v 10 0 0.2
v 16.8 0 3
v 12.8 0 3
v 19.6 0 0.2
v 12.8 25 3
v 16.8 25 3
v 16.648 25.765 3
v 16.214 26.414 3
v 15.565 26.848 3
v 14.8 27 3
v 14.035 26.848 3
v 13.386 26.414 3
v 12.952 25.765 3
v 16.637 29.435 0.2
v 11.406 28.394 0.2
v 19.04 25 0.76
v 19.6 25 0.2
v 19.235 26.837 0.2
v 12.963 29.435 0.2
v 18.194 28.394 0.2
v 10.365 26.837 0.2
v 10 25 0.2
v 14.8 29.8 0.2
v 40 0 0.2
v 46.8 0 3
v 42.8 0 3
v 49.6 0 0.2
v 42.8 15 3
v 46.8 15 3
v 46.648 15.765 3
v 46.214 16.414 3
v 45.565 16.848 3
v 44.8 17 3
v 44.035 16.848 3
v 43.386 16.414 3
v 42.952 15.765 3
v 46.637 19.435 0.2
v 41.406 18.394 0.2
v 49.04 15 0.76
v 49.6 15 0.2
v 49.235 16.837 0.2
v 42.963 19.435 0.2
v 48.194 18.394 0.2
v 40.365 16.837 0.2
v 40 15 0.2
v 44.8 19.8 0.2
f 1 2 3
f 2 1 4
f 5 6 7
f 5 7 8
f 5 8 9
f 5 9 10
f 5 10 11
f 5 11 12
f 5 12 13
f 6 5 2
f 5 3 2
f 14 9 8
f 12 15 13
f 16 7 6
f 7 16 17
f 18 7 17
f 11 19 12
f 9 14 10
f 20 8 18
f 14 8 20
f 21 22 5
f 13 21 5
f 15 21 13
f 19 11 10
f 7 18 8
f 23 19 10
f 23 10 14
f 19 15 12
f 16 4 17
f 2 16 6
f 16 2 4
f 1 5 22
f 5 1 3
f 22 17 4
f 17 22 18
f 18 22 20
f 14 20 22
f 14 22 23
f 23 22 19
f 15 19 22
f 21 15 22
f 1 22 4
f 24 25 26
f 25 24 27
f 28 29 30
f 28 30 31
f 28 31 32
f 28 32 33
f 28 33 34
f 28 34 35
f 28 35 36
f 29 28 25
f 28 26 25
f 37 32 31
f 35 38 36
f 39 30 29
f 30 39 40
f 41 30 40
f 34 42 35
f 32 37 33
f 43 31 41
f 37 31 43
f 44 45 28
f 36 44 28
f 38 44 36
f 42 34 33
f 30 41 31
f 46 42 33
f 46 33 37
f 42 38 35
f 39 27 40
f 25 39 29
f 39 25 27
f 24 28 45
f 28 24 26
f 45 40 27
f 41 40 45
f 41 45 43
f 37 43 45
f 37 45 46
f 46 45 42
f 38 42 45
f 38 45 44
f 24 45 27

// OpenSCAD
// file: phgUtils.scad
/*
 *  OpenSCAD utilities 
 *
 *  by Ph.Gregoire AKA Greg Ware <greg.ware@laposte.net>
 *  
 *  Includes:
 *   - shorter macro modules to get a cube or cylinder with translation and rotation
 *   -  Due to some display defects in OpenSCAD preview (F5), some can use a small epsilon 
 *      so as to cut protruding apertures in solids
 *   - useful modules to build rounded corner cubes, triangle (wedges), etc
 *
 * History
 * Date         Author      Description
 * 2017/??/??   Ph.Gregoire Initial version(s)
 * 2018/07/18   Ph.Gregoire Rework for X5S corners
 *
 *  This work is licensed under the 
 *  Creative Commons Attribution 3.0 Unported License.
 *  To view a copy of this license, visit
 *    http://creativecommons.org/licenses/by/3.0/ 
 *  or send a letter to 
 *    Creative Commons, PO Box 1866, Mountain View, CA 94042, USA.
*/

// Thickness of supports for apertures
$_SUPPORT_THK=0.2;

// Cylinders $fn default
$_FN_CYL=32;

// Epsilon
$_EPSILON=0.2;

/* Simple translation */
module tr(dx,dy=0,dz=0) {
    translate([dx,dy,dz]) children();
}

/* Translate and rotate children */
module trrot(tx,ty,tz,ax,ay=0,az=0) {
    translate([tx,ty,tz]) rotate([ax,ay,az]) children();
}

/* translated cube */
module trcube(tx,ty,tz,dx,dy,dz) {
    translate([tx,ty,tz]) cube([dx,dy,dz]);
}

/* translated cube with epsilons along Z */
module trcube_eps(tx,ty,tz,dx,dy,dz) {
    translate([tx,ty,tz-$_EPSILON]) cube([dx,dy,dz+2*$_EPSILON]);
}

/* translated cylinder */
module trcyl(tx,ty,tz,d,h,center=false,fn=$_FN_CYL) {
	translate([tx,ty,tz]) cylinder(d=d,h=h,center=center,$fn=fn);
}

/* translated cylinder with epsilon along height (Z) */
module trcyl_eps(tx,ty,tz,d,h,center=false,fn=$_FN_CYL) {
    translate([tx,ty,tz-$_EPSILON]) cylinder(d=d,h=h+2*$_EPSILON,center=center,$fn=fn);
}

module trrotcyl(tx,ty,tz,ax,ay,az,d,h,center=false,fn=$_FN_CYL) {
	trrot(tx,ty,tz,ax,ay,az) cylinder(d=d,h=h,center=center,$fn=fn);
}

/* translated and rotated cylinder with epsilon along height (Z) */
module trrotcyl_eps(tx,ty,tz,ax,ay,az,d,h,center=false,fn=$_FN_CYL) {
    trrot(tx,ty,tz,ax,ay,az) translate([0,0,-$_EPSILON]) cylinder(d=d,h=h+2*$_EPSILON,center=center,$fn=fn);
}

/* translated and rotated cube */
module trrotcube(tx,ty,tz,ax,ay,az,dx,dy,dz) {
    trrot(tx,ty,tz,ax,ay,az) cube([dx,dy,dz]);
}

/* Translated rotate cube with diff children (in cube referential) */
module trrotcube_diff(tx,ty,tz,ax,ay,az,dx,dy,dz) {
    trrot(tx,ty,tz,ax,ay,az) difference() {
        cube([dx,dy,dz]);
        children();
    }
}

/* Box with apertures cut out from children */
module boxWithApertures(w,l,h,t) {
    // Bottom
    trcube(-w/2-t,-l/2-t,0,w+2*t,l+2*t,t);

    // sides
    for(s=[0:3]) {
        L=w*((s+1)%2)+l*(s%2)+2*t;
        P=l*((s+1)%2)+w*(s%2);
        
        rotate([0,0,s*90]) {
            translate([-L/2,P/2,t]) {
                difference() {
                    cube([L,t,h]);
                    // aperture
                    if($children>s) {
                        translate([thk,thk,0]) rotate([90,0,0]) children(s);
                    }
                }
            }
        }
    }

}

/* Make a support: remove a thin support layer from a flat shape */
module supportDiff(thk) {
    difference() {
        children(0);
        translate([0,0,thk/2]) {
            linear_extrude(height=$_SUPPORT_THK) projection() children(0);
        }
    }
}

/* Lateral vents 
    n: number of vents
    h: height of vent and vent spacing
    l: horizontal length of vent
    x: horizontal x offset of vent
    z: vertical offset of first vent
    t: thickness of panel
*/
module vents(n,h,l,x,z,t) {
    for(v=[0:n-1]) {
        trcube_eps(x,z+2*v*h,0,l,h,t);
    }
}

/* Fan vent 
    w: width of panel
    dz: height of center of fan
    df: diameter of fan
    dh: diameter of hub
    fs: Number of fan spokes
    t: thickness of panel
*/
module fanvent(w,dz,df,dh,fs,t) {
    difference() {
        // External
        trcyl_eps(w/2,dz,0,df,t);
        
        // central hub
        trcyl_eps(w/2,dz,0,dh,t);
        
        // spokes
        translate([w/2,dz,0]) {
            for(a=[0:fs-1]) {
                rotate([0,0,180+a*(360/fs)]) trcube_eps(-t/2,0,0,t,df,t);
            }
        }
    }
}
/* Fan mounting holes
    w: Width of panel
    dz: height of center of fan
    wfh: width of fan holes
    dfh: diameter of fan holes
    t: thickness of panel
*/
module fanholes(w,dz,wfh,dfh,t) {
    for(x=[-1,1]) {
        for(y=[-1,1]) {
            trcyl_eps(w/2+wfh/2*x,dz+wfh/2*y,0,dfh,t);
        }
    }
}

/* Position children in one corner of box, using a centered box */
module cornerPos(w,l,h,x,y,center=true) {
    translate([center?x*w/2:(x+1)*w/2,center?y*l/2:(y+1)*l/2,h]) {
        if(x==-1 && y==-1) children();
        if(x==1 && y==-1) rotate([0,0,90]) children();
        if(x==1 && y==1) rotate([0,0,180]) children();
        if(x==-1 && y==1) rotate([0,0,270]) children();
    }
}

/* Position children at each 4 corners of centered cube */ 
module cornersPos(w,l,h,center=true) {
 for(x=[-1,1]) {
        for(y=[-1,1]) {
            cornerPos(w,l,h,x,y,center=center) children();
        }
    }
}


/* Quarter Cone */
module quarterCone(r1,r2,h) {
    intersection() {
        cylinder(r1=r2,r2=r1,h=h);
        cube([r1>r2?r1:r2,r1>r2?r1:r2,h]);
    }
}

module quarterCyl(r,h) {
    intersection() {
        cylinder(r=r,h=h,$fn=$_FN_CYL);
        cube([r,r,h]);
    }
}

/* Corner rounding */
module champfer(rounding,h) {
    difference() {
        translate([-$_EPSILON,-$_EPSILON,-$_EPSILON])
            cube([rounding+$_EPSILON,rounding+$_EPSILON,h+2*$_EPSILON]);
        translate([rounding,rounding])
            cylinder(r=rounding,h=h);
    }
}

/* Triangle by extrusion. the a parameter is the rotation angle */
module triangle(dx,dy,h,a=0) {
    if(a<0) triangle(dx,dy,h,a=a+360);
    else {
        a=a%360;
        linear_extrude(height=h) {
            if(a<90) polygon(points=[[0,0],[dx,0],[0,dy],[0,0]]);
            else if(a<180) polygon(points=[[0,0],[dx,dy],[dx,0],[0,0]]);
            else if(a<270) polygon(points=[[dx,dy],[0,dy],[dx,0],[dx,dy]]);
            else if(a<360) polygon(points=[[0,0],[dx,dy],[0,dy],[0,0]]);
        }
    }
}

module roundedFlatBox(dx,dy,h,r) {
    linear_extrude(height=h)
    offset(r=r)
    translate([r,r]) square([dx-2*r,dy-2*r]);
}

module roundedBoundingBox(dx,dy,dz,rx,ry,rz) {
    minkowski() {
        trcube(rx,ry,rz,dx-2*rx,dy-2*ry,dz-2*rz);
        r=max(rx,ry,rz);
        scale([rx/r,ry/r,rz/r]) sphere(r);
    }
}

test();

module test() {
    //triangle(30,20,10,270);
    //quarterCyl(5,10);
    //champfer(5,10);
    roundedBoundingBox(40,50,20,5,10,7);
}
// main file
/*
 * Ultimate Tronxy X5S Corner Pulley Mounts
 *   
 * Dimensioning assumptions:
 *   - Motor shafts are aligned 20 mm to the inside of the frame
 *   - Pulleys diameter is 12 mm, with a 5mm bore, mounted on M5 screws
 *
 * Note that most dimensions are not arbitrary, and computed from physical
 * values of the printer and pulleys, designed so that belts run parallel 
 * to axis movements
 * 
 * Full Tronxy model requires 2020profile.scad from https://www.thingiverse.com/thing:2533048/files
 *
 * The design is inspired but not quite remixed from several existing
 * ones available notably on Thingiverse
 * 
 * Source maintained in GitHub at https://github.com/greg-ware/TronxyX5SUpgrades
 *
 +--------------------------------------------------------------------------
 | History
 | Date       |Version |Author      |Description
 | 2018/07/?? | <= v2  |Ph.Gregoire |Initial version(s)
 | 2018/07/07 | v3     |Ph.Gregoire |Proper belts alignement
 | 2018/07/16 | v4     |Ph.Gregoire |Extend legs, add champfers
 | 2018/07/19 | v4.01  |Ph.Gregoire |Fix TNut hammer size
 | 2018/07/19 | v4.02  |Ph.Gregoire |Fix tenon issue
 | 2018/07/18 | v5     |Ph.Gregoire |Endstop mount, zendstop arm, pulley raiser
 | 2018/07/25 | v5.1   |Ph.Gregoire |Fix pulley raiser
 | 2018/07/26 | v6.01  |Ph.Gregoire |Fix dimentional issues: sides too high
 | 2018/07/26 | v6.02  |Ph.Gregoire |Remove unusable TNut hole
 | 2018/07/26 | v6.03  |Ph.Gregoire |Fix pulley shaft position for belt paralelism
 | 2018/07/26 | v6.04  |Ph.Gregoire |Through-holes to access or replace corner screws
 | 2018/07/26 | v6.05  |Ph.Gregoire |Switches repositioning
 | 2018/07/26 | v6.06  |Ph.Gregoire |Side T-Nut repositioning
 | 2018/07/26 | v7.0   |Ph.Gregoire |Full Tronxy model reconstitution
 | 2018/10/14 | v8.0   |Ph.Gregoire |Use Conical head side TNut screws
 | 2018/10/14 | v8.01  |Ph.Gregoire |Add rigidification slits on the sides
 +-------------------------------------------------------------------------
 *
 *  This work is licensed under the 
 *  Creative Commons Attribution 3.0 Unported License.
 *  To view a copy of this license, visit
 *    http://creativecommons.org/licenses/by/3.0/ 
 *  or send a letter to 
 *    Creative Commons, PO Box 1866, Mountain View, CA 94042, USA.
*/

use <phgUtils.scad>

/* Modify the following parameter to generate
    - corner for LEFT or RIGHT side 
    - pulley raiser
*/
SIDE="LEFT";
//SIDE="RIGHT";

PART="CORNER";
//PART="RAISER";
//PART="ZENDSTOP";    // Generate the Z endstop support
//PART="CORNER_RAISER";
PART="SLITS";

/* Modify following depending if endstop is Left or right, or to print Z endstop arm */
ENDSTOPS="LEFT";
//ENDSTOPS="RIGHT";

/* Arbitrary parameters */
// Top plate thickness (original acrylic plate is 8mm, but this makes screw seats thin)
thk=10;	

// Thickness of external side walls
wallThk=5;

// Layer Height
layerH=0.2;

// champfer radius
champR=4;
champRPlate=3;

// profile tenon dimensions
tenonHeight=5.5;
tenonWidth=6;

// Size of the corner plate. Original is 
lFront=65;	// length along front (x)
lSide=60;	// length along side (y)

/* Below are the physical characteristics and dimensions of the new pulleys and axles */
pulleyDiam=12;
pulleyAxleDiam=5;	// pulley axles diameter
pulleyAxleHexThk=2.6;   // thickness of hex nut (M5) - keep mult of layer height

pulleyAxleHeadThk=3.6;  // thickness of screwHead (M5) - keep mult of layer height

/* M5x30 Axle screw */
pulleyAxleHeadDiam=11.5; 	// Diameter of the M5 screw head
pulleyAxleHeadThk=3.6;  // thickness of screwHead (M5) - keep mult of layer height

/* M5x50 Axle Screw (Poeliers) 
pulleyAxleHeadDiam=12; 	// Diameter of the M5 screw head
pulleyAxleHeadThk=2.8;  // thickness of screwHead (M5) - keep mult of layer height
*/

pulleyAxleHexDiam=9.5;  // diameter of hex nut (M5)

pulleyRaiserDiam=18;
pulleyHeight=8; // to determine raiser height

/* Rigidification slits 
   The slits will be sliced across the top plate and half way into the height */
slitDepth=3;
slitWidth=10;

/********************************************************/
/* Fixed constants of X5S by construction               */
profW=20;	// width of profile
motorShaftInset=20; // Distance from outside frame by which the motors shafts are inset
motorPulleyDiam=12; // Diameter of the motor pulley

// X-profile Assembly screws characteristics
assemblyScrewHeadDiam=9;
assemblyScrewHeadThk=2.5;
assemblyScrewDiam=5;

// T-nut screw dimensions
tnutScrewDiam=4;
tnutScrewSeatDiam=7.5;  // Diameter of the screw head
tnutHammerDiam=12;      // Diameter of the diagonal of the hammer nut

// top plate tnut positioning, this is somewhat arbitrary
tnutScrewSeatDepth=4;       // original has 8mm thickness
tnutScrewDistFromEdge=6;    // distance from edge of top plate tnut screw

// side TNut positioning, this is more or less arbitrary
sideTNutInset=0; /*v6.06*///profW/2; // How much to inset the TNut holes on the sides
sideTNutOffset=3*profW/2; // How much to offset the TNut holes on the sides
// Conical side TNut screw heads
sideTNutSeatDepth=2.4;  // slightly countersunken side screw heads (Was 1.4)
sideTNutScrewDiam=7.4;

// Endstops
endsHolesDiam=1;    // Diameter of the drill hole
endsHolesSpacing=10;// Spacing between the two screw holes
endsWidth=20;       // With of the endstop boxing

endsSwitchDepth=9;  // Distance from holes at which endstop closes
endsXHolesMegaGantryOffset=20; // How much to offset the holes for mega-gantry

// Z endstop support will be bolted on 20x40 frame
endsZSupportWidth=15;
endsZSupportLength=110;
switchHolesDiam=1.5;
switchHolesSpacing=10;
switchWidth=20;
switchHolesOffset=7.5;

/************************************************************************/
/* Begin computations                                                   */
/* Following parameters are computed from physical dimensions above     */

// positioning of outer pulley axle
outerAxleX=profW/2;
outerAxleY=motorShaftInset+(pulleyDiam-motorPulleyDiam)/2;

// positioning of inner pulley axle
innerAxleX=profW+pulleyAxleHeadDiam/2;
innerAxleY=outerAxleY+pulleyDiam;

// Compute overall widths
wFront=profW+wallThk;	// width along front (x)
wSide=profW+wallThk;	// width along sides (y)

// positions of shoulder notch: leave enough material for robustness
xNotch=wallThk+innerAxleX+pulleyAxleDiam+wallThk;
yNotch=wallThk+innerAxleY+pulleyAxleDiam;

// Cylinders $fn default
$_FN_CYL=32;
$_FN_CHAMP=16;

// Epsilon
$_EPSILON=0.2;

function getX5SPhysics()=[thk,wallThk,profW,ENDSTOPS,[outerAxleX,outerAxleY],[innerAxleX,innerAxleY]];

module tnutHole(tx,ty,seatDepth,h) {
	translate([tx,ty,-$_EPSILON]) {
		cylinder(d=tnutScrewSeatDiam,h=seatDepth+2*$_EPSILON,$fn=$_FN_CYL);
		cylinder(d=tnutScrewDiam,h=h+2*$_EPSILON,$fn=$_FN_CYL);
	}
}

module tnutConicalHole(tx,ty,seatDepth,h) {
	translate([tx,ty,-$_EPSILON]) {
		cylinder(d1=tnutScrewSeatDiam,d2=tnutScrewDiam,h=seatDepth+2*$_EPSILON,$fn=$_FN_CYL);
		cylinder(d=tnutScrewDiam,h=h+2*$_EPSILON,$fn=$_FN_CYL);
	}
}

module tnutTopPlateHole(tx,ty) {
    tnutHole(tx,ty,tnutScrewSeatDepth,thk);
}

module tnutSideWallHole(tx,ty) {
    tnutConicalHole(tx,ty,sideTNutSeatDepth,wallThk);
}

module shaftHoleScrew(x,y,t,screwDiam,screwHeadThk,screwHeadDiam,isScrew=true,isTop=false) {
    // make recess for pulley axle screw head
    if(isScrew) {
        trcyl_eps(x,y,isTop?0:t-screwHeadThk,screwHeadDiam,screwHeadThk);
    }
    
    // shaft for pulley axle screw
    trcyl_eps(x,y,0,screwDiam,t);
}

module shaftHoleScrewHexNut(x,y,t,screwDiam,screwHeadThk,screwHeadDiam,screwHexThk,screwHexDiam,isScrew=true,isHexNut=true) {
    
    shaftHoleScrew(x,y,t,screwDiam,screwHeadThk,screwHeadDiam,isScrew);

    // Imprint of hex nut
    if(isHexNut) {
        trcyl_eps(x,y,0,screwHexDiam,screwHexThk,fn=6);
    }
}   

module pulleyShaftHole(x,y,isScrew,isHexNut) {
    shaftHoleScrewHexNut(x+wallThk,y+wallThk,thk+tenonHeight,pulleyAxleDiam,pulleyAxleHeadThk+tenonHeight,pulleyAxleHeadDiam,pulleyAxleHexThk,pulleyAxleHexDiam,isScrew,isHexNut);
}

module basePlate(isLeft) {
	difference() {
		union() {
			// base plate
			linear_extrude(height=thk,convexity=2) {
                offset(r=champRPlate,$fn=$_FN_CHAMP)
				polygon(points=[
                            [champRPlate,champRPlate],
                            [lSide-champRPlate,champRPlate],
                            [lSide-champRPlate,wSide-champRPlate],
                            [xNotch-champRPlate,wSide-champRPlate],
                            [xNotch-champRPlate,yNotch-champRPlate],
                            [wFront,lFront-champRPlate],
                            [champRPlate,lFront-champRPlate],
                            [champRPlate,champRPlate]]);
			}
            
			// tenon along Front
            tenonFront_Pos=wallThk;//+outerAxleY+pulleyAxleHeadDiam/2;
            trcube(wallThk+profW/2-tenonWidth/2,tenonFront_Pos,thk,
              tenonWidth,lFront-tnutScrewDistFromEdge-tnutHammerDiam/2-tenonFront_Pos,tenonHeight);

			// tenon along Side
            tenonSide_Pos=wallThk+max(outerAxleX+pulleyAxleHeadDiam/2,profW);
			trcube(tenonSide_Pos,wallThk+profW/2-tenonWidth/2,thk,
              lSide-tnutScrewDistFromEdge-tnutHammerDiam/2-tenonSide_Pos,tenonWidth,tenonHeight);
		}
        // Remove hole for the head of the profiles assembly screws
        // The position of that is in the middle of the second profile
        for(p=[1,3]) {
            x=wallThk+p*profW/2;
            y=wallThk+profW/2;
            trcyl(x,y,thk+tenonHeight-assemblyScrewHeadThk,assemblyScrewHeadDiam,assemblyScrewHeadThk+$_EPSILON);
            shaftHoleScrew(x,y,thk+tenonHeight,assemblyScrewDiam,assemblyScrewHeadThk,assemblyScrewHeadDiam,true,true);
		}
        
        // Holes for the 3 TNuts
		/*v6.02*/ //tnutTopPlateHole(profW/2+wallThk,wallThk+tnutHammerDiam/2,0);
		tnutTopPlateHole(profW/2+wallThk,lFront-tnutScrewDistFromEdge);
		tnutTopPlateHole(lSide-tnutScrewDistFromEdge,profW/2+wallThk);
        
        // axle shafts: LEFT corner has outer LOW (hex imprint) and inner HIGH (no hex imprint)
        
        // outer axle shaft hole, always has recess for screw head
        // pulleyShaftHole(outerAxleX,outerAxleY,true);
		pulleyShaftHole(outerAxleX,outerAxleY,true,isLeft);
		
        // inner axle shaft hole, no need for screw head recess
		pulleyShaftHole(innerAxleX,innerAxleY,true,!isLeft);
	}
}

module sideWithLeg(l,isFront) {
    if(!isFront) mirror([1,0,0]) rotate([0,0,90]) sideWithLeg(l,true) children();
    else
    rotate([0,-90,-90])
    difference() {
        linear_extrude(height=wallThk,convexity=2)
            offset(r=champR,$fn=$_FN_CHAMP)
            polygon(points=[[0,champR],
                            [profW*2-champR,champR],
                            [profW*2-champR,wallThk+profW-champR],
                            [profW-champR,wallThk+profW+profW/2-champR],
                            [profW-champR,l-champR],
                            [0,l-champR]]);
        
        // Outermost top bar TNut hole
        tnutSideWallHole(profW/2,sideTNutInset>0?l-sideTNutInset:sideTNutOffset+wallThk);

        // Leg TNut hole
        tnutSideWallHole(profW+profW/2,wallThk+profW/2);
        
        // extra holes
        children();
    }
}

module sides() {
    intersection() {
        translate([0,0,thk]) {
            // Side side with one hole
            sideWithLeg(lSide,true);
            
            // Front side with two holes
            sideWithLeg(lFront,false) {
                /*v6.02*///tnutSideWallHole(profW/2,wallThk+sideTNutInset);
            }
        }
        
        // round the corners
        roundedBoundingBox(lSide,lFront,thk+2*profW,champRPlate,champRPlate,champR,$fn=$_FN_CHAMP);
    }
}

module _sideSlits() {
    _twoSlits(true,slitWidth,slitDepth);
    _twoSlits(false,slitWidth,slitDepth);  
}

module _twoSlits(isSide,sw,sd,deltaH=0) {
    _sideSlit(profW/2,thk+profW-deltaH,isSide?0:1,sw,sd);
    _sideSlit((isSide?lSide:lFront)-profW,thk+profW/2-deltaH,isSide?0:1,sw,sd);
}

module _sideSlit(x,l,m=0,sw,sd) {
    rotate([0,0,90*m]) {
        translate([x,0,0]) {
            mirror([0,m,0]) _slit(l,sw,sd);
        }
    }
}

module _slit(l,sw,sd) {
    intersection() {
        linear_extrude(l) {
            polygon([[sd,0],[0,sd],[sw,sd],[sw-sd,0]]);
        }
        union() {
            trcube(0,0,0,sw,sd,l-sw/2);
            trrot(sw/2,sd,l-sw/2,90,0,0) cylinder(d1=sw,d2=sw-sd*2,h=sd);
        }
    }
}

module _corner(isLeft,isEndStops) {
    difference() {
        union() {
            basePlate(isLeft);
            sides();
            children();
        }
        _sideSlits();
        if(isEndStops) {
            // Holes for switch
            for(dx=[0,endsXHolesMegaGantryOffset/2,endsXHolesMegaGantryOffset,3*endsXHolesMegaGantryOffset/2]) {
                tr(lSide-switchHolesOffset-dx,0,switchWidth/2) rotate([-90,0,0])
            switchHoles();
            }
        }
    }
}
module switchHoles(x=0,y=0,z=0,ax=0,ay=0,az=0) {
    for(i=[-1,1]) {
        trrotcyl_eps(x,y+i*switchHolesSpacing/2,z,ax,ay,az,switchHolesDiam,wallThk);
    }
}

module zEndstopArm(isLeft) {
    if(!isLeft) translate([endsZSupportWidth,0,0]) mirror([1,0,0]) zEndstopArm(true);
    else difference() {
        union() {
            roundedFlatBox(endsZSupportWidth,endsZSupportLength,wallThk,champR);
            tr(-profW+endsZSupportWidth/2,profW) roundedFlatBox(profW*2,profW,wallThk,champR);
        }
        for(i=[-1,1]) tnutSideWallHole(endsZSupportWidth/2+i*profW/2,3*profW/2);
        tnutSideWallHole(endsZSupportWidth/2,profW/2);
        switchHoles(endsZSupportWidth-switchHolesOffset,endsZSupportLength-switchWidth/2,0);
    }
}

module pulleyRaiser(isLeft) {
    tr(0,0,pulleyHeight) mirror([0,0,1]) difference() {
        cylinder(d=pulleyRaiserDiam,h=pulleyHeight,$fn=$_FN_CYL*2);
        shaftHoleScrewHexNut(0,0,pulleyHeight,pulleyAxleDiam,pulleyAxleHeadThk,pulleyAxleHeadDiam,pulleyAxleHexThk,pulleyAxleHexDiam,false);
       
        //pulleyShaftNut(0,0,pulleyHeight);
		if(!isLeft) {
            // drill a hole to access for screwing the T-Nut
  trcyl_eps(0,outerAxleX,0,assemblyScrewHeadDiam,pulleyHeight);
		}
    }
}

module part(partType,side,endStops) {
    isLeft=side=="LEFT";
    isRight=side=="RIGHT";
    if(partType=="CORNER") {
		if(isLeft) {
			// Build for left
			_corner(true,endStops==side) children();
		} else if(isRight) {
			// Mirror and build for right
			rotate([0,0,90]) {
				mirror([0,1,0]) {
					_corner(false,endStops==side) children();
				}
			}
		} else {
			echo("Specify a valid SIDE for CORNER PART");
		}
    } else if(partType=="RAISER") {
        pulleyRaiser(side=="LEFT");
    } else if(partType=="ZENDSTOP") {
        zEndstopArm(endStops=="LEFT");
    } else if(partType=="CORNER_RAISER") {
        part("CORNER",side,endStops)
        trrot(wallThk+((isLeft)?innerAxleX:outerAxleX),wallThk+(isLeft?innerAxleY:outerAxleY),0,180) part("RAISER",side,endStops);
    } else if(partType=="SLITS") {
        trrot(0,0,slitDepth,-90,0,0) {
            _twoSlits(true,slitWidth-layerH*2,slitDepth-layerH,layerH);
        }
    } else {
        echo("Set value of PART properly!");
    }
}

part(PART,SIDE,ENDSTOPS);
